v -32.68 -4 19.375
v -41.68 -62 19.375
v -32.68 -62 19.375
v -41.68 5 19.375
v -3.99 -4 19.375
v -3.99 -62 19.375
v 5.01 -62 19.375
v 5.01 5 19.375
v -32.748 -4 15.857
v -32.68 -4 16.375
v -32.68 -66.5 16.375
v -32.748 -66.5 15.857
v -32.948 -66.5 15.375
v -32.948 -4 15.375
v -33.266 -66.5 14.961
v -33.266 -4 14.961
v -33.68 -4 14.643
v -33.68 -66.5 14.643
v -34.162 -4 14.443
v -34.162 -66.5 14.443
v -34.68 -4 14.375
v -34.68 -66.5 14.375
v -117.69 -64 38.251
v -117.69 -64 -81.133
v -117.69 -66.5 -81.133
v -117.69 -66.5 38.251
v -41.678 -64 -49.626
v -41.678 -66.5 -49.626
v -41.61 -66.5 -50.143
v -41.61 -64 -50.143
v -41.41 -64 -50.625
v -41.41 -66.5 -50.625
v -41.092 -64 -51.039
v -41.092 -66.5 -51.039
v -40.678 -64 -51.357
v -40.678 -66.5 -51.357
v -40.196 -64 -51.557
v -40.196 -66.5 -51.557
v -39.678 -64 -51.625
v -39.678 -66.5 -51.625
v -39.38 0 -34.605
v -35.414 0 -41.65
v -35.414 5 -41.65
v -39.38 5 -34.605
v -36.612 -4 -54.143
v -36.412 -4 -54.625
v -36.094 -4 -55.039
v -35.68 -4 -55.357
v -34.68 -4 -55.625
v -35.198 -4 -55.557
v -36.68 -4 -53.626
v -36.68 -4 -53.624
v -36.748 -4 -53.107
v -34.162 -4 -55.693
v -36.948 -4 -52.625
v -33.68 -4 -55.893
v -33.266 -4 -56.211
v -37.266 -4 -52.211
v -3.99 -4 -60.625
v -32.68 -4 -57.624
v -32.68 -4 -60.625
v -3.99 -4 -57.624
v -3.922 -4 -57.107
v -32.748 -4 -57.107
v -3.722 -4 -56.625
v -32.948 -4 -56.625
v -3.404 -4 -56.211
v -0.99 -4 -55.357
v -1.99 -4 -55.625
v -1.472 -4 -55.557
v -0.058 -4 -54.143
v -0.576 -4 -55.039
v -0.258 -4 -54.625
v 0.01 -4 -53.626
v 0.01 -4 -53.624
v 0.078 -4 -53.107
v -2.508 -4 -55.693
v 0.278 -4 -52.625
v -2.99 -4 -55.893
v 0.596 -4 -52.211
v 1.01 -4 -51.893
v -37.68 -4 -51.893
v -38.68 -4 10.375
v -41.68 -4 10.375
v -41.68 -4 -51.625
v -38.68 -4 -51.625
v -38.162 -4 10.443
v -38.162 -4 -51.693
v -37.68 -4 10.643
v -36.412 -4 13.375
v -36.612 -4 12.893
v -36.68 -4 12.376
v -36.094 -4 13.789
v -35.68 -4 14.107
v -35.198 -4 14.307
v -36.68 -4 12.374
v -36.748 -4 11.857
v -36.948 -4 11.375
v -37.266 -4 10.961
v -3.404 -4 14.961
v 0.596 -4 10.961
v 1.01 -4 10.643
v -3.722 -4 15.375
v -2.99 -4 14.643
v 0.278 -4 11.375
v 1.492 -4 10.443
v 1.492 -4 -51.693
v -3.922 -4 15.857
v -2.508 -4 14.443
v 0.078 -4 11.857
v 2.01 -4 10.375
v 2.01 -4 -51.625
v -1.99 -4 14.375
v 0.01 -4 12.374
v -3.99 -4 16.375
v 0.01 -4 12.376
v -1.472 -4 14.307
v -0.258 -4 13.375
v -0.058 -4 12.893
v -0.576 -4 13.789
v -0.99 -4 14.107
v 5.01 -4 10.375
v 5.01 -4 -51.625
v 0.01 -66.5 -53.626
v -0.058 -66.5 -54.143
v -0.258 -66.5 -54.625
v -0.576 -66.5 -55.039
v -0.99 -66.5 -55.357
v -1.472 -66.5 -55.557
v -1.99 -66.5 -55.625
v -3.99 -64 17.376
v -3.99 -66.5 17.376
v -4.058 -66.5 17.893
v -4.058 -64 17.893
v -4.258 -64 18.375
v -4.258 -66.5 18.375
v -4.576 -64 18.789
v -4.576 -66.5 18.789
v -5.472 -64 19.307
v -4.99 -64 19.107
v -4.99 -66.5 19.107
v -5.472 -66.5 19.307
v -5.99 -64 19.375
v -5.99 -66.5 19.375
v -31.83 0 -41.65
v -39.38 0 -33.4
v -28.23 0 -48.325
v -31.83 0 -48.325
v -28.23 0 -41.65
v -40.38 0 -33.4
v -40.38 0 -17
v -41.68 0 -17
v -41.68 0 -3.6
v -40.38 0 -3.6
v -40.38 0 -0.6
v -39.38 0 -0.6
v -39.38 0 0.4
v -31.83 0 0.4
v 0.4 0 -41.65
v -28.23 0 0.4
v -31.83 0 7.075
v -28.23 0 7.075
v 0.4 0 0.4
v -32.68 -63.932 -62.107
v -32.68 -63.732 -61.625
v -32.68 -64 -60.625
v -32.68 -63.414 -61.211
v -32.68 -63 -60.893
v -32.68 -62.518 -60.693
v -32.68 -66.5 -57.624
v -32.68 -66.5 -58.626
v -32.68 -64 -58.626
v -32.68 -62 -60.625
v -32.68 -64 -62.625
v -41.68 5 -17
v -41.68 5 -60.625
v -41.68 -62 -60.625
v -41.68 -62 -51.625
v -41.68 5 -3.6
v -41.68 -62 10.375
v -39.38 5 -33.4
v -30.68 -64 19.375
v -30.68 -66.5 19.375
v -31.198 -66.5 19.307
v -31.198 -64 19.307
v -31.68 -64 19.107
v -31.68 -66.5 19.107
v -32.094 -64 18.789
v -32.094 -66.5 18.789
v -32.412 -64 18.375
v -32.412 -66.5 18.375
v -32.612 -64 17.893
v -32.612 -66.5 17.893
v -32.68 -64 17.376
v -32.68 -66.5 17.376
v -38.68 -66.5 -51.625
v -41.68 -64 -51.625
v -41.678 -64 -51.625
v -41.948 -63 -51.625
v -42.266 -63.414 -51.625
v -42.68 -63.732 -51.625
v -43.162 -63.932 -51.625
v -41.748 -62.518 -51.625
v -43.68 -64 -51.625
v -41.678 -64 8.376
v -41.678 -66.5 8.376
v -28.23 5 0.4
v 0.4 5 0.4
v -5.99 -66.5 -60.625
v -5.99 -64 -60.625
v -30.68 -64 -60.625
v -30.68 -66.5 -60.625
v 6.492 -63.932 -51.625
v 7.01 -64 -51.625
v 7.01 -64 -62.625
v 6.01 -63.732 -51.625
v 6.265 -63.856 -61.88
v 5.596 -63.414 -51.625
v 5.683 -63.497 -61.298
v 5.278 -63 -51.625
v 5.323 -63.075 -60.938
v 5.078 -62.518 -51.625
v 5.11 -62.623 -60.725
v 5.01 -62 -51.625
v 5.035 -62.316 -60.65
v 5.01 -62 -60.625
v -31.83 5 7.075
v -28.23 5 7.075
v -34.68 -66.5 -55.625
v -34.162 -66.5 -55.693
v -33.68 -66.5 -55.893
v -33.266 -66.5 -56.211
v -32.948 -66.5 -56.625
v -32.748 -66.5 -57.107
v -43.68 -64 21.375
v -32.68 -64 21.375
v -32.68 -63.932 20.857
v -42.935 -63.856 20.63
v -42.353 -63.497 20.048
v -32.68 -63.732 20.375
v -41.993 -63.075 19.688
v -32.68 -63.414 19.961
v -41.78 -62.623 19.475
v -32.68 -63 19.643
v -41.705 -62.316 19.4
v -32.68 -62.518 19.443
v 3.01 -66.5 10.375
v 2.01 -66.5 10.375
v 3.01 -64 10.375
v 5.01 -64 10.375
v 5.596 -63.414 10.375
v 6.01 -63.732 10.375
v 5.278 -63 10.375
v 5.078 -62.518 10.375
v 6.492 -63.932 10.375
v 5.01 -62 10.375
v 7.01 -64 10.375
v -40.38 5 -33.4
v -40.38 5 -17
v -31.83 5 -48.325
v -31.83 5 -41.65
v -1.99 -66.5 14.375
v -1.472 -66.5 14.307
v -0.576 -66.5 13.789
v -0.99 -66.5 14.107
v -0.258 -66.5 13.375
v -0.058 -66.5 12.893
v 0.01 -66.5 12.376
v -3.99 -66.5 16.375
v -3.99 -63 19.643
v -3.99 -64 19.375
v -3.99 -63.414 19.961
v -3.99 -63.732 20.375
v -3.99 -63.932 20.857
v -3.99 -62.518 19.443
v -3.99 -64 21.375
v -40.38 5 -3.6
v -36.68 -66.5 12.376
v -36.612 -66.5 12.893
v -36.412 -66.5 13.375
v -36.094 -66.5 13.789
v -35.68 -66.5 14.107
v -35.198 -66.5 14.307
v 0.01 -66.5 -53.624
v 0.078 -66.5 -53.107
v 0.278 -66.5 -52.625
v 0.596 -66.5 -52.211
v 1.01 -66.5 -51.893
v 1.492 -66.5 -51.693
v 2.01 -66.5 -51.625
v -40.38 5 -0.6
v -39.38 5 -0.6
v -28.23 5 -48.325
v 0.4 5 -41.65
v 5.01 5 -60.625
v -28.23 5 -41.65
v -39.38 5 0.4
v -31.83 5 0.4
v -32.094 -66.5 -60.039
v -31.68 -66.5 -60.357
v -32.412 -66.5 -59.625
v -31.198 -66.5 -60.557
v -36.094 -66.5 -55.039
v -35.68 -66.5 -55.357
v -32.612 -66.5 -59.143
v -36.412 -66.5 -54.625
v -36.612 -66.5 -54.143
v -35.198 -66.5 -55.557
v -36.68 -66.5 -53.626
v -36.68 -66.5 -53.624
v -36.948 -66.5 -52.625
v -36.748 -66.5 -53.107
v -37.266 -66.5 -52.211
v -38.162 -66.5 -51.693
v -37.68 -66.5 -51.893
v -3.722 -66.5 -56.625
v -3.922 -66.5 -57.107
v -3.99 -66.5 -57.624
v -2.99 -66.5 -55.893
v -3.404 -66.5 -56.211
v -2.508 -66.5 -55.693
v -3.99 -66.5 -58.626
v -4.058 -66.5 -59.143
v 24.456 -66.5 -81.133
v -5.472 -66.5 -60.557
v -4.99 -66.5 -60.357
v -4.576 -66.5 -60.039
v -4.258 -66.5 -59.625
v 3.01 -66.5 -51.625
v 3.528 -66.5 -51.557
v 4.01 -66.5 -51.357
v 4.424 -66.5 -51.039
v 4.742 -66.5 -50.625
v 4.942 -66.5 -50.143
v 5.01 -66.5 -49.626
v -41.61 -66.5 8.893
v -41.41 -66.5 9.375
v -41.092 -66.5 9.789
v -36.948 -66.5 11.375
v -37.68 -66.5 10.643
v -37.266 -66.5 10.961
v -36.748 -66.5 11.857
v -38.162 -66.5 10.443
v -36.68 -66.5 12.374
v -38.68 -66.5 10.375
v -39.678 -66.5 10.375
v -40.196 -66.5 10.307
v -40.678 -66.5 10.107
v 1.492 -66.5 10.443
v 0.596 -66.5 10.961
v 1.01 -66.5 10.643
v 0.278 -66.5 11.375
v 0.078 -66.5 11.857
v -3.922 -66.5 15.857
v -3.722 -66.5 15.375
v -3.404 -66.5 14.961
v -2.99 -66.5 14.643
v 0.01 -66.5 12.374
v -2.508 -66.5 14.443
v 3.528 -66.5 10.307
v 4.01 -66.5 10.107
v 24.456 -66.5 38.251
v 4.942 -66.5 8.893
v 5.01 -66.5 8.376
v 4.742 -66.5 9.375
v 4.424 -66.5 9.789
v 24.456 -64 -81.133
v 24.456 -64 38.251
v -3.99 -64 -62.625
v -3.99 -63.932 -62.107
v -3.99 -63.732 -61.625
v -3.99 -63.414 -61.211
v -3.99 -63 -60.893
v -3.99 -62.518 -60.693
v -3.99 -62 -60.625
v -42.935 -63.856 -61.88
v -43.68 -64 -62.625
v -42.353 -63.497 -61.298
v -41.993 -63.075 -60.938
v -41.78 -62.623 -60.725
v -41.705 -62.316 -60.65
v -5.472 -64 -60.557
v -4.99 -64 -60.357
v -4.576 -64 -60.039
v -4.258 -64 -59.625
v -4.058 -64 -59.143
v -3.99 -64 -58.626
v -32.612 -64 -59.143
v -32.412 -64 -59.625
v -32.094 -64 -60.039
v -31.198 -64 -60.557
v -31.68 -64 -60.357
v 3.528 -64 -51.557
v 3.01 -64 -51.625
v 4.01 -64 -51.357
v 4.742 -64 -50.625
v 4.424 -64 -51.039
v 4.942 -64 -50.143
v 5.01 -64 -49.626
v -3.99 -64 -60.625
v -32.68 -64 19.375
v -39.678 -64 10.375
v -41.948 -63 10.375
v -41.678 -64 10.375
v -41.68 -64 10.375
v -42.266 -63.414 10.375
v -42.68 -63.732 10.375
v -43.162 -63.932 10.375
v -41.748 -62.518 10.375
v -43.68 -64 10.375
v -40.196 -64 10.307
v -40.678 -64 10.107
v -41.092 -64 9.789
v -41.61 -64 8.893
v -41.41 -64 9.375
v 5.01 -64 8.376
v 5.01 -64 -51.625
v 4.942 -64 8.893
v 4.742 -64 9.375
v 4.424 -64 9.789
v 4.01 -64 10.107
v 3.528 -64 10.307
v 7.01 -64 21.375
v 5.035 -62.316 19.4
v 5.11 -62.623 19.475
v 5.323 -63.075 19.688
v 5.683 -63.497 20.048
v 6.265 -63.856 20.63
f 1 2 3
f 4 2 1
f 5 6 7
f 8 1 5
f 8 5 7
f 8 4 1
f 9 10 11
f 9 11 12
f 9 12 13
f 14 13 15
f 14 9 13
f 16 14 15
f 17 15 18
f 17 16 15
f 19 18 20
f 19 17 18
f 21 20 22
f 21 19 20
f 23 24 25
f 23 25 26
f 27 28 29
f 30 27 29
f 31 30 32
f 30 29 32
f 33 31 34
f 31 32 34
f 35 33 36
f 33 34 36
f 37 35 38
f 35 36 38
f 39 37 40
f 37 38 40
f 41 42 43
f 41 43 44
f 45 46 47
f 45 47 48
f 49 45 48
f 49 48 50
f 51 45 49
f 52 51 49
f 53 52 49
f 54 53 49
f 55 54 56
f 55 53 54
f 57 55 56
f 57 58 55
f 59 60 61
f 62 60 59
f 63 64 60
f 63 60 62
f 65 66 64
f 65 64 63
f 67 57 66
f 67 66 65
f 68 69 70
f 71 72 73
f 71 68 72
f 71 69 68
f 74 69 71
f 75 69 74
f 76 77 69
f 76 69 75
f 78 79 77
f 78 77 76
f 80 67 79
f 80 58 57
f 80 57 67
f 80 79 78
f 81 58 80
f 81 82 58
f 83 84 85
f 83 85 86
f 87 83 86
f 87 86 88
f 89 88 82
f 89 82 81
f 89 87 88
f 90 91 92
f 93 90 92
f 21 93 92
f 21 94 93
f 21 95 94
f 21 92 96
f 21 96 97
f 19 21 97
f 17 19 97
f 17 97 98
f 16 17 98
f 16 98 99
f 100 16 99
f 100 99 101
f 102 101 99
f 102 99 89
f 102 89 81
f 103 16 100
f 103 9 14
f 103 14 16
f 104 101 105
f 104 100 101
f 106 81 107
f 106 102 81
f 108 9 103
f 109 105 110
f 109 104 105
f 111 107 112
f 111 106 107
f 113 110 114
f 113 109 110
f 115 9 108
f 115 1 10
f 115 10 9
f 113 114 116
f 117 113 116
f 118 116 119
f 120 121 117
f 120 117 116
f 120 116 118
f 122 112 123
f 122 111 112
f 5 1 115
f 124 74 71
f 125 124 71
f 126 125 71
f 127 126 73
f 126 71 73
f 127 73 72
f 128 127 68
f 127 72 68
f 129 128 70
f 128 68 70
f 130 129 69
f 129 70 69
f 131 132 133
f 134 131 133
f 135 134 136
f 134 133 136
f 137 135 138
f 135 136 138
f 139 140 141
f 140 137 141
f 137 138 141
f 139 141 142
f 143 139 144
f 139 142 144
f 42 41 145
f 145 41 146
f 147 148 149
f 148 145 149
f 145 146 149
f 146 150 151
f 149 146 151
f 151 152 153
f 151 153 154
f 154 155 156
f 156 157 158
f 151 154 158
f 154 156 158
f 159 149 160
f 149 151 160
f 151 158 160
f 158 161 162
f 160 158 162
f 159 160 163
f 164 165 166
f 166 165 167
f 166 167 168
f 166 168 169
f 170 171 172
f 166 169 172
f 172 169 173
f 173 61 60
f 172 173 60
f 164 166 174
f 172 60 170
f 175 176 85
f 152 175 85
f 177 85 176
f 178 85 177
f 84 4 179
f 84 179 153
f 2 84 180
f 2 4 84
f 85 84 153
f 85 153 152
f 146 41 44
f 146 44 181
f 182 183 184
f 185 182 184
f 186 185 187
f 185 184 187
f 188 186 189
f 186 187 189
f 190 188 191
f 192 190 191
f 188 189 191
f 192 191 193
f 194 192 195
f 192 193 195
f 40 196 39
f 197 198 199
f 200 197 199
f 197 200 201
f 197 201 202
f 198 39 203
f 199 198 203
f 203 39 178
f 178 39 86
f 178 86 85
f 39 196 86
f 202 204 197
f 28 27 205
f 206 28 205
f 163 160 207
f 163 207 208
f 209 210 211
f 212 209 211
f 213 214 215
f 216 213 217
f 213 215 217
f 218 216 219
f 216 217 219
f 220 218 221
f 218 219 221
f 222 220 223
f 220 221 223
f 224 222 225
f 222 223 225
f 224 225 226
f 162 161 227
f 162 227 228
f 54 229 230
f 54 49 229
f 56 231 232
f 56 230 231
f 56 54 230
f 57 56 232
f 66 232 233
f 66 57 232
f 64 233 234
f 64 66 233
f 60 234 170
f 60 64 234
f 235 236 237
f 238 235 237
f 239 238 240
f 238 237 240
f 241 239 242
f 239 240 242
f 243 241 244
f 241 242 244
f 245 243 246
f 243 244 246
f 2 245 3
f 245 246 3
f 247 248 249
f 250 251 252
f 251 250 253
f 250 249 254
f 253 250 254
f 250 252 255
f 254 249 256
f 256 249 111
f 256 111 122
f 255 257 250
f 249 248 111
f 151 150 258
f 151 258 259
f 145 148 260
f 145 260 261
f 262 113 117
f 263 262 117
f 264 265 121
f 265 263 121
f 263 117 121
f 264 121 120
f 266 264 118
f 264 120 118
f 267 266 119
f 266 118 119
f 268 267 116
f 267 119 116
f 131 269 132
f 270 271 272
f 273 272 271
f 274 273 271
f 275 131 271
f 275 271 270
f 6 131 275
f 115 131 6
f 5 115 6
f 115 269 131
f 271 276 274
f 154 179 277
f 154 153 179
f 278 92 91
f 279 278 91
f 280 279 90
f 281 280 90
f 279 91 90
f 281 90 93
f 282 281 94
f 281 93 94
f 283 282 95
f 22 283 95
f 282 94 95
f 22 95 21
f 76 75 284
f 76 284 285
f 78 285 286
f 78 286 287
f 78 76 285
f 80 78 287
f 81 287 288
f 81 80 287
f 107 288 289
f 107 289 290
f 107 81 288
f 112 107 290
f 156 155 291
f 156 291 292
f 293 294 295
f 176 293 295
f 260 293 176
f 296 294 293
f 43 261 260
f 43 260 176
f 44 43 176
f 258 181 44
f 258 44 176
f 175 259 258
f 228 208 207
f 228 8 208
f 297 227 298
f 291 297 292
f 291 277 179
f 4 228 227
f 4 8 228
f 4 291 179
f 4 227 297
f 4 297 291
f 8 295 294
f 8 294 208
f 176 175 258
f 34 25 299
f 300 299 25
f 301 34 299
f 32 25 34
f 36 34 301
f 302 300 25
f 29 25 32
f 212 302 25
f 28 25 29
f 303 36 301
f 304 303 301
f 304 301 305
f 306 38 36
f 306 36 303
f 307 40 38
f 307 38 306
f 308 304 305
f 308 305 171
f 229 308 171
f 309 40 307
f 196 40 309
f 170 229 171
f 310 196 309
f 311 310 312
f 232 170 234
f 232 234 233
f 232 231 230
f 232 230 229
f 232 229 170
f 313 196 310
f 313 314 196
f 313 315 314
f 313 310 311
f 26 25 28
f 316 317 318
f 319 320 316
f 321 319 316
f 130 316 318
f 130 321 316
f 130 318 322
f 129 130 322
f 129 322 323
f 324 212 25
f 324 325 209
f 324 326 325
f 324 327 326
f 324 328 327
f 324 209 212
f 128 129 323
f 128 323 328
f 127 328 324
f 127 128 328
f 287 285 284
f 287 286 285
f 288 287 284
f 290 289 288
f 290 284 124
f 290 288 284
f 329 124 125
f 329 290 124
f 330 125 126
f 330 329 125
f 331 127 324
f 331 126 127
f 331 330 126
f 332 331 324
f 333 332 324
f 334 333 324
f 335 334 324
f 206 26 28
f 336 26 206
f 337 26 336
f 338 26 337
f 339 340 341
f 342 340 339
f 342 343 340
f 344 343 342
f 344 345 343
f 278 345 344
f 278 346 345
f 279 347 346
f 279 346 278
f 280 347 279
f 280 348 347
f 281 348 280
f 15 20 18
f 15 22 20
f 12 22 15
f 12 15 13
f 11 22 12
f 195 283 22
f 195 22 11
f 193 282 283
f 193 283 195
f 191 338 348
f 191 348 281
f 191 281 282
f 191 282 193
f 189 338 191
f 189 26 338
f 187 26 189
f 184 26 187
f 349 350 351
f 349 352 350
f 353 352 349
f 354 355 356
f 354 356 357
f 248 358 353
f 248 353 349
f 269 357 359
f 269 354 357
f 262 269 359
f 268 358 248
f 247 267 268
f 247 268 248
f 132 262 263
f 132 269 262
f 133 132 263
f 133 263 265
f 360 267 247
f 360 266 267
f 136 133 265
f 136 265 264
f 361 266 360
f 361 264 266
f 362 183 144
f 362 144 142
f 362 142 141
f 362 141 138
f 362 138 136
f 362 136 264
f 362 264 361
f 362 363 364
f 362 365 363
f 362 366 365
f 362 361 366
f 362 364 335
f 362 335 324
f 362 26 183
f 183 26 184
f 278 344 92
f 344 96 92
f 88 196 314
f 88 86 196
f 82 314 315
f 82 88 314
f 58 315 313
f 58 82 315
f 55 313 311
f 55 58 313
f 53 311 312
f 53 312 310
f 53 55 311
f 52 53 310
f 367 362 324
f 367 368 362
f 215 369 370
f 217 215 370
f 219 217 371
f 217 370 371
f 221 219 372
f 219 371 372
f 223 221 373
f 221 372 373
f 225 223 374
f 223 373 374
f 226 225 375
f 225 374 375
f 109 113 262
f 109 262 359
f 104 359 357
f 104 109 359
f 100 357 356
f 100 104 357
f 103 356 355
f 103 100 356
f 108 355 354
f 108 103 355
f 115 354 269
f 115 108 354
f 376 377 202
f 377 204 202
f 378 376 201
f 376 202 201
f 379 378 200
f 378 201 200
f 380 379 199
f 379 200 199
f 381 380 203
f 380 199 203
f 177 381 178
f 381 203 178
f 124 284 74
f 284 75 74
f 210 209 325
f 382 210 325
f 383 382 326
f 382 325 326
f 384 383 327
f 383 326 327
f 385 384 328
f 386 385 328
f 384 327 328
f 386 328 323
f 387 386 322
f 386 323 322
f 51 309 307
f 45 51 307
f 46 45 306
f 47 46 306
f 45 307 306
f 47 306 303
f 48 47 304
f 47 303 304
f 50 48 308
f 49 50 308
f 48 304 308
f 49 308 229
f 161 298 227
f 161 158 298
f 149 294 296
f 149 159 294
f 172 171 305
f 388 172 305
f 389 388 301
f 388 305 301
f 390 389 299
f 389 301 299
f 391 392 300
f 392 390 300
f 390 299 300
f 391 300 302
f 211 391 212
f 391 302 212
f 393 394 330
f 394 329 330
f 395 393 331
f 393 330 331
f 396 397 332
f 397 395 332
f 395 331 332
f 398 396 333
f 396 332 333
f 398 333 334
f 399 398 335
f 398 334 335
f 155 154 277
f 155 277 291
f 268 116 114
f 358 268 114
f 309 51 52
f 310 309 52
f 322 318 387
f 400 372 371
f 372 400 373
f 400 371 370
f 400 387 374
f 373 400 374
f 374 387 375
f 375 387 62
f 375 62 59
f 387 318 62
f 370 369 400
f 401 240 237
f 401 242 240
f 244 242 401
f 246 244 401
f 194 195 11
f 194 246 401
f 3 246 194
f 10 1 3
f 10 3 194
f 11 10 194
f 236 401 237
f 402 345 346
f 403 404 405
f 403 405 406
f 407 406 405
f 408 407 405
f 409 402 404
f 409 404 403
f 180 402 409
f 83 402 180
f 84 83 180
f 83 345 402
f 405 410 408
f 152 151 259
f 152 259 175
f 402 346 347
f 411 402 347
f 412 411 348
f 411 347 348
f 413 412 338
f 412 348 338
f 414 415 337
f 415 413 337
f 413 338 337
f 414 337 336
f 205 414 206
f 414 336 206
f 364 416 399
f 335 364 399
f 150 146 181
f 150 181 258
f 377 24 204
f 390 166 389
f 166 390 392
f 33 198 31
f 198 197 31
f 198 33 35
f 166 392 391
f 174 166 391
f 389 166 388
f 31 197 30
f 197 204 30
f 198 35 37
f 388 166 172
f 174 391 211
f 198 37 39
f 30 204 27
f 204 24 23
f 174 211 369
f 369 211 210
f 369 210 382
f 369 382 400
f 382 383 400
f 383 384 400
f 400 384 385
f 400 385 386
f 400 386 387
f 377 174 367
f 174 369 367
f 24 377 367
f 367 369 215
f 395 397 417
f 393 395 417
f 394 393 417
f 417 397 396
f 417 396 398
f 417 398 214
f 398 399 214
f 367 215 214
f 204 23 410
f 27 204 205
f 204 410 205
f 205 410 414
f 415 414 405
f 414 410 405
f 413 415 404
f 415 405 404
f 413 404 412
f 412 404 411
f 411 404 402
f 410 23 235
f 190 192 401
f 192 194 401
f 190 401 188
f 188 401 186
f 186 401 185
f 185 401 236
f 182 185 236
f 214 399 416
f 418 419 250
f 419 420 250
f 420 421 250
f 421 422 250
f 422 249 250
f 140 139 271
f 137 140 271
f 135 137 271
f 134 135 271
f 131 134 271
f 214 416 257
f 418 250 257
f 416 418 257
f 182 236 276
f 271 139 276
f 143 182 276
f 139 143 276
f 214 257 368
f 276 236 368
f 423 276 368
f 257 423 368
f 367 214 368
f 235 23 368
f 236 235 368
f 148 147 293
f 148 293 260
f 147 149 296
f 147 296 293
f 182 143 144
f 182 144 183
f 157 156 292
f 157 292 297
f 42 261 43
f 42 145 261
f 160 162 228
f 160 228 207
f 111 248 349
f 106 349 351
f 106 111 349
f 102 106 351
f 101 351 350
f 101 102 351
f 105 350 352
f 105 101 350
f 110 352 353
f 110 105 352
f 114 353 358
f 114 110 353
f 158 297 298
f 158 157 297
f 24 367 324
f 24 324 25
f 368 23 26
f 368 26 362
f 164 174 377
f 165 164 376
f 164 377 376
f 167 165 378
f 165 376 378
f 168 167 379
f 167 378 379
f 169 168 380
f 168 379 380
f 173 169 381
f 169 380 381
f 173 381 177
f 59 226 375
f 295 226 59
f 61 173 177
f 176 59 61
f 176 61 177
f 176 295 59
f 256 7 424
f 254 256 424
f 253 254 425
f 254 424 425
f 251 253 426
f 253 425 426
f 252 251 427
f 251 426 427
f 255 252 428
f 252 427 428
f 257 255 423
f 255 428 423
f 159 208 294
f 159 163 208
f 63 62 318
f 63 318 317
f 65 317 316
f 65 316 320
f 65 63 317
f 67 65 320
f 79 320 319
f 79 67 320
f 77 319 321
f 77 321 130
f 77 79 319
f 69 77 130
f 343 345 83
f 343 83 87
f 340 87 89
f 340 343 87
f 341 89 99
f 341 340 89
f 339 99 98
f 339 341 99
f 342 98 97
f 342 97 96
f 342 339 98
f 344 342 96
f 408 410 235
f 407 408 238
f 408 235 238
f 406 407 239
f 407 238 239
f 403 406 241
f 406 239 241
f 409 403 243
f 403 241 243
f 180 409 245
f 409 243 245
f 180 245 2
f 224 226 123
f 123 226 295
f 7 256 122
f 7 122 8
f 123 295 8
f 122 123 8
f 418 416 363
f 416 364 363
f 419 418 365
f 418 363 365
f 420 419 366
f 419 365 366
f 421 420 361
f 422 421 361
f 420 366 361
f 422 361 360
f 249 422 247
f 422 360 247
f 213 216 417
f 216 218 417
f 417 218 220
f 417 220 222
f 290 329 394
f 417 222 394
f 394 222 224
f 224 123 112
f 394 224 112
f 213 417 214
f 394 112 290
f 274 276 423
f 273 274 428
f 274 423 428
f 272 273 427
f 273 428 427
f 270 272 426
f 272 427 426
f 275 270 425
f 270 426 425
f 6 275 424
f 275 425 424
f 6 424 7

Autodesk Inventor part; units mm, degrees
ref_plane "YZ Plane" through (0, 0, 0) normal (1, 0, 0) x (0, 1, 0)
ref_plane "XZ Plane" through (0, 0, 0) normal (0, 1, 0) x (-1, 0, 0)
ref_plane "XY Plane" through (0, 0, 0) normal (0, 0, 1) x (1, 0, 0)
sketch "Sketch1" plane through (0, 0, 0) normal (0, 1, 0) x (-1, 0, 0)
  line L0 (0, 0) -> (28.63, 0)
  line L1 (28.63, 0) -> (28.63, -41.25) construction
  line L2 (28.63, -41.25) -> (0, -41.25)
  line L3 (0, -41.25) -> (0, 0)
  line L4 (28.63, 6.675) -> (31.43, 6.675)
  line L5 (31.43, 6.675) -> (31.43, 0)
  line L6 (31.43, -47.925) -> (28.63, -47.925)
  line L7 (28.63, -47.925) -> (28.63, -41.25)
  line L8 (31.43, -20.625) -> (28.63, -20.625) construction
  line L9 (38.98, 0) -> (31.43, 0)
  line L10 (31.43, 0) -> (31.43, -41.25) construction
  line L11 (31.43, -41.25) -> (35.18, -41.25)
  line L12 (38.98, -41.25) -> (38.98, -34.5) construction
  line L13 (31.43, -41.25) -> (35.18, -41.25) construction
  line L14 (38.98, 0) -> (38.98, -1) construction
  line L15 (38.98, -34.5) -> (35.18, -41.25)
  line L16 (38.98, -34.5) -> (38.98, -33)
  line L17 (35.18, -41.25) -> (38.98, -41.25) construction
  line L18 (38.98, 0) -> (38.98, -1) construction
  line L19 (38.98, -1) -> (39.98, -1)
  line L20 (39.98, -1) -> (39.98, -4)
  line L21 (39.98, -33) -> (38.98, -33)
  line L22 (38.98, -33) -> (38.98, -1) construction
  line L23 (38.98, -1) -> (38.98, -33) construction
  line L24 (38.98, -33) -> (38.98, -34.5) construction
  line L25 (38.98, -1) -> (38.98, 0)
  line L26 (38.98, -33) -> (38.98, -1) construction
  line L27 (31.43, 0) -> (31.43, -41.25) construction
  line L28 (31.43, -41.25) -> (31.43, -47.925)
  line L29 (28.63, -41.25) -> (28.63, 0) construction
  line L30 (28.63, 0) -> (28.63, 6.675)
  line L31 (28.63, 0) -> (31.43, 0) construction
  line L32 (31.43, -41.25) -> (28.63, -41.25) construction
  line L33 (39.98, -1) -> (39.98, -4) construction
  line L34 (39.98, -4) -> (41.28, -4)
  line L35 (41.28, -4) -> (41.28, -16.6)
  line L36 (41.28, -16.6) -> (39.98, -16.6)
  line L37 (39.98, -16.6) -> (39.98, -4) construction
  line L38 (39.98, -4) -> (39.98, -16.6) construction
  line L39 (39.98, -16.6) -> (39.98, -33)
  line L40 (41.68, -17) -> (41.68, -3.6)
  line L41 (41.68, -3.6) -> (40.38, -3.6)
  line L42 (40.38, -3.6) -> (40.38, -0.6)
  line L43 (40.38, -0.6) -> (39.38, -0.6)
  line L44 (39.38, -0.6) -> (39.38, 0.4)
  line L45 (39.38, 0.4) -> (31.83, 0.4)
  line L46 (31.83, 0.4) -> (31.83, 7.075)
  line L47 (31.83, 7.075) -> (28.23, 7.075)
  line L48 (28.23, 7.075) -> (28.23, 0.4)
  line L49 (28.23, 0.4) -> (-0.4, 0.4)
  line L50 (-0.4, 0.4) -> (-0.4, -41.65)
  line L51 (-0.4, -41.65) -> (28.23, -41.65)
  line L52 (28.23, -41.65) -> (28.23, -48.325)
  line L53 (28.23, -48.325) -> (31.83, -48.325)
  line L54 (31.83, -48.325) -> (31.83, -41.65)
  line L55 (31.83, -41.65) -> (35.4138, -41.65)
  line L56 (35.4138, -41.65) -> (39.38, -34.6049)
  line L57 (39.38, -34.6049) -> (39.38, -33.4)
  line L58 (39.38, -33.4) -> (40.38, -33.4)
  line L59 (40.38, -33.4) -> (40.38, -17)
  line L60 (40.38, -17) -> (41.68, -17)
  line L61 (0, -20.625) -> (39.98, -20.625) construction
  line L62 (44.99, 9.375) -> (-5.01, 9.375)
  line L63 (-5.01, 9.375) -> (-5.01, -50.625)
  line L64 (-5.01, -50.625) -> (44.99, -50.625)
  line L65 (44.99, -50.625) -> (44.99, 9.375)
  line L66 (19.99, 9.375) -> (19.99, -50.625) construction
  point P0 (30.03, 6.675)
  point P1 (19.99, -20.625)
  dimension "d0" = 28.63
  dimension "d1" = 41.25
  dimension "d2" = 2.8
  dimension "d3" = 54.6
  dimension "d4" = 7.55
  dimension "d5" = 41.25
  dimension "d6" = 3.75
  dimension "d7" = 34.5
  dimension "d8" = 1
  dimension "d9" = 32
  dimension "d10" = 1
  dimension "d11" = 6.675
  dimension "d12" = 3
  dimension "d13" = 1.3
  dimension "d14" = 12.6
  dimension "d15" = 0.4
  dimension "d16" = 50
  dimension "d17" = 60
extrude "Extrusion1" add sketch "Sketch1" along normal blind 5 contours L65 L64 L63 L62
sketch "Sketch2" plane through (0, 5, 0) normal (0, 1, 0) x (1, 0, 0)
  line L0 (-44.99, 50.625) -> (-44.99, -9.375) projected
  line L1 (5.01, 50.625) -> (-44.99, 50.625) projected
  line L2 (-44.99, -9.375) -> (-41.68, -9.375)
  line L3 (-41.68, -9.375) -> (-41.68, 50.625)
  line L4 (-41.68, 50.625) -> (-44.99, 50.625)
  line L5 (-44.99, 50.625) -> (-44.99, -9.375)
  point P0 (0, 0)
  dimension "d20" = 3.31
extrude "Extrusion2" cut sketch "Sketch2" against normal through all
sketch "Sketch3" plane through (0, 0, 0) normal (0, -1, 0) x (1, 0, 0)
  line L0 (5.01, 9.375) -> (5.01, -50.625) projected
  line L1 (-41.68, -17) -> (-41.68, -50.625) projected
  line L2 (5.01, 9.375) -> (-41.68, 9.375)
  line L3 (-41.68, 9.375) -> (-41.68, -50.625)
  line L4 (-41.68, -50.625) -> (5.01, -50.625)
  line L5 (5.01, -50.625) -> (5.01, 9.375)
  point P0 (0, 0)
extrude "Extrusion3" add sketch "Sketch3" along normal blind 4
sketch "Sketch4" plane through (-41.68, 5, 9.375) normal (0, 0, 1) x (1, 0, 0)
  line L0 (0, 0) -> (0, -9) projected
  line L1 (46.69, -9) -> (46.69, 0) projected
  line L2 (0, 0) -> (46.69, 0)
  line L3 (46.69, 0) -> (46.69, -9)
  line L4 (46.69, -9) -> (0, -9)
  line L5 (0, -9) -> (0, 0)
  point P0 (41.68, -5)
extrude "Extrusion4" add sketch "Sketch4" along normal blind 10
sketch "Sketch5" plane through (5.01, 5, -50.625) normal (0, 0, -1) x (-1, 0, 0)
  line L0 (0, 0) -> (46.69, 0) projected
  line L1 (46.69, 0) -> (46.69, -9) projected
  line L2 (0, 0) -> (46.69, 0)
  line L3 (46.69, 0) -> (46.69, -9)
  line L4 (46.69, -9) -> (0, -9)
  line L5 (0, -9) -> (0, 0)
  point P0 (5.01, -5)
extrude "Extrusion5" add sketch "Sketch5" along normal blind 10
sketch "Sketch6" plane through (0, -4, 0) normal (0, -1, 0) x (1, 0, 0)
  line L0 (-41.68, 19.375) -> (5.01, 19.375) projected
  line L1 (5.01, 19.375) -> (0.01, 19.375)
  line L2 (0.01, 14.375) -> (0.01, 10.375)
  line L3 (0.01, 10.375) -> (5.01, 10.375)
  line L4 (5.01, 10.375) -> (5.01, 19.375)
  line L5 (5.01, 19.375) -> (-3.99, 19.375)
  line L6 (-3.99, 19.375) -> (-3.99, 14.375)
  line L7 (-3.99, 14.375) -> (0.01, 14.375)
  line L8 (5.01, 14.375) -> (5.01, 19.375)
  point P0 (0, 0)
  dimension "d29" = 5
  dimension "d30" = 9
  dimension "d31" = 9
  dimension "d32" = 5
extrude "Extrusion6" add sketch "Sketch6" along normal blind 60
sketch "Sketch7" plane through (0, -4, 0) normal (0, -1, 0) x (1, 0, 0)
  line L0 (5.01, -60.625) -> (5.01, 19.375) projected
  line L1 (5.01, -60.625) -> (-3.99, -60.625)
  line L2 (-3.99, -60.625) -> (-3.99, -55.625)
  line L3 (-3.99, -55.625) -> (0.01, -55.625)
  line L4 (5.01, -55.625) -> (5.01, -60.625)
  line L5 (5.01, -60.625) -> (0.01, -60.625)
  line L6 (0.01, -55.625) -> (0.01, -51.625)
  line L7 (0.01, -51.625) -> (5.01, -51.625)
  line L8 (5.01, -51.625) -> (5.01, -60.625)
  line L9 (-41.68, -60.625) -> (-41.68, 19.375) projected
  line L10 (-41.68, -60.625) -> (-32.68, -60.625)
  line L11 (-32.68, -60.625) -> (-32.68, -55.625)
  line L12 (-32.68, -55.625) -> (-36.68, -55.625)
  line L13 (-41.68, -55.625) -> (-41.68, -60.625)
  line L14 (-41.68, -60.625) -> (-36.68, -60.625)
  line L15 (-36.68, -55.625) -> (-36.68, -51.625)
  line L16 (-36.68, -51.625) -> (-41.68, -51.625)
  line L17 (-41.68, -51.625) -> (-41.68, -60.625)
  line L18 (-41.68, 19.375) -> (-32.68, 19.375)
  line L19 (-32.68, 19.375) -> (-32.68, 14.375)
  line L20 (-32.68, 14.375) -> (-36.68, 14.375)
  line L21 (-41.68, 14.375) -> (-41.68, 19.375)
  line L22 (-41.68, 19.375) -> (-36.68, 19.375)
  line L23 (-36.68, 14.375) -> (-36.68, 10.375)
  line L24 (-36.68, 10.375) -> (-41.68, 10.375)
  line L25 (-41.68, 10.375) -> (-41.68, 19.375)
  point P0 (0, 0)
  dimension "d35" = 9
  dimension "d36" = 5
  dimension "d37" = 5
  dimension "d38" = 9
  dimension "d39" = 9
  dimension "d40" = 5
  dimension "d41" = 5
  dimension "d42" = 9
  dimension "d43" = 9
  dimension "d44" = 5
  dimension "d45" = 5
  dimension "d46" = 9
extrude "Extrusion7" add sketch "Sketch7" along normal blind 60
sketch "Sketch8" plane through (0, -64, 0) normal (0, -1, 0) x (1, 0, 0)
  line L0 (24.4558, -81.1334) -> (-117.6901, -81.1334)
  line L1 (-117.6901, -81.1334) -> (-117.6901, 38.2506)
  line L2 (-117.6901, 38.2506) -> (24.4558, 38.2506)
  line L3 (24.4558, 38.2506) -> (24.4558, -81.1334)
  point P0 (0, 0)
extrude "Extrusion8" add sketch "Sketch8" along normal blind 2.5
sketch "Sketch9" plane through (0, -64, 0) normal (0, 1, 0) x (1, 0, 0)
  line L0 (-36.68, -10.375) -> (-36.68, -14.375) projected
  line L1 (0.01, 51.625) -> (0.01, 55.625) projected
  line L2 (-36.68, -14.375) -> (0.01, -14.375)
  line L3 (0.01, -14.375) -> (0.01, 55.625)
  line L4 (0.01, 55.625) -> (-36.68, 55.625)
  line L5 (-36.68, 55.625) -> (-36.68, -14.375)
  line L6 (-3.99, -19.375) -> (-32.68, -19.375)
  line L7 (-41.68, -10.375) -> (-41.68, 51.625)
  line L8 (-3.99, 60.625) -> (5.01, 60.625) projected
  line L9 (-32.68, 60.625) -> (-3.99, 60.625)
  line L10 (5.01, 51.5309) -> (5.01, -10.375)
  point P0 (0, 0)
extrude "Extrusion9" cut sketch "Sketch9" against normal blind 2.5
sketch "Sketch10" plane through (0, -64, 0) normal (0, 1, 0) x (1, 0, 0)
  line L0 (0.01, -10.375) -> (5.01, -10.375) projected
  line L1 (5.01, 51.625) -> (0.01, 51.625) projected
  line L2 (0.01, -10.375) -> (5.01, -10.375)
  line L3 (5.01, -10.375) -> (5.01, 51.625)
  line L4 (5.01, 51.625) -> (0.01, 51.625)
  line L5 (0.01, 51.625) -> (0.01, -10.375)
  line L6 (-3.99, 55.625) -> (-3.99, 60.625) projected
  line L7 (-32.68, 60.625) -> (-32.68, 55.625) projected
  line L8 (-3.99, 60.625) -> (-32.68, 60.625)
  line L9 (-32.68, 60.625) -> (-32.68, 55.625)
  line L10 (-32.68, 55.625) -> (-3.99, 55.625)
  line L11 (-3.99, 55.625) -> (-3.99, 60.625)
  line L12 (-36.68, 55.625) -> (-36.68, -14.375) projected
  line L13 (-36.68, 51.625) -> (-41.6778, 51.625)
  line L14 (-41.6778, 51.625) -> (-41.6778, -10.375)
  line L15 (-41.6778, -10.375) -> (-36.68, -10.375)
  line L16 (-36.68, -10.375) -> (-36.68, 51.625)
  line L17 (-3.99, -14.375) -> (-32.68, -14.375) projected
  line L18 (-32.68, -14.375) -> (-3.99, -14.375)
  line L19 (-3.99, -14.375) -> (-3.99, -19.375)
  line L20 (-3.99, -19.375) -> (-32.68, -19.375)
  line L21 (-32.68, -19.375) -> (-32.68, -14.375)
  point P0 (0, 0)
extrude "Extrusion10" cut sketch "Sketch10" against normal blind 2.5
fillet "Fillet1" radius 2 5 edges at (-3.99, -65.25, -60.625) (0.01, -35.25, -55.625) (0.01, -35.25, -51.625) (-3.99, -35.25, -55.625) (5.01, -65.25, -51.625)
fillet "Fillet2" radius 2 10 edges at (5.01, -65.25, 10.375) (0.01, -35.25, 10.375) (0.01, -35.25, 14.375) (-3.99, -35.25, 14.375) (-3.99, -65.25, 19.375) (-32.68, -65.25, 19.375) (-32.68, -35.25, 14.375) (-36.68, -35.25, 14.375) (-36.68, -35.25, 10.375) (-41.6778, -65.25, 10.375)
fillet "Fillet3" radius 2 5 edges at (-36.68, -35.25, -51.625) (-36.68, -35.25, -55.625) (-32.68, -35.25, -55.625) (-32.68, -65.25, -60.625) (-41.6778, -65.25, -51.625)
fillet "Fillet4" radius 2 8 edges at (-41.68, -64, -56.125) (-37.18, -64, -60.625) (-41.68, -64, 14.875) (-37.18, -64, 19.375) (0.51, -64, 19.375) (5.01, -64, 14.875) (5.01, -64, -56.125) (0.51, -64, -60.625)
equation "\"d5\" = d1"
properties part number "OMG_20kg_servo_side_profile(0.4mm)"
